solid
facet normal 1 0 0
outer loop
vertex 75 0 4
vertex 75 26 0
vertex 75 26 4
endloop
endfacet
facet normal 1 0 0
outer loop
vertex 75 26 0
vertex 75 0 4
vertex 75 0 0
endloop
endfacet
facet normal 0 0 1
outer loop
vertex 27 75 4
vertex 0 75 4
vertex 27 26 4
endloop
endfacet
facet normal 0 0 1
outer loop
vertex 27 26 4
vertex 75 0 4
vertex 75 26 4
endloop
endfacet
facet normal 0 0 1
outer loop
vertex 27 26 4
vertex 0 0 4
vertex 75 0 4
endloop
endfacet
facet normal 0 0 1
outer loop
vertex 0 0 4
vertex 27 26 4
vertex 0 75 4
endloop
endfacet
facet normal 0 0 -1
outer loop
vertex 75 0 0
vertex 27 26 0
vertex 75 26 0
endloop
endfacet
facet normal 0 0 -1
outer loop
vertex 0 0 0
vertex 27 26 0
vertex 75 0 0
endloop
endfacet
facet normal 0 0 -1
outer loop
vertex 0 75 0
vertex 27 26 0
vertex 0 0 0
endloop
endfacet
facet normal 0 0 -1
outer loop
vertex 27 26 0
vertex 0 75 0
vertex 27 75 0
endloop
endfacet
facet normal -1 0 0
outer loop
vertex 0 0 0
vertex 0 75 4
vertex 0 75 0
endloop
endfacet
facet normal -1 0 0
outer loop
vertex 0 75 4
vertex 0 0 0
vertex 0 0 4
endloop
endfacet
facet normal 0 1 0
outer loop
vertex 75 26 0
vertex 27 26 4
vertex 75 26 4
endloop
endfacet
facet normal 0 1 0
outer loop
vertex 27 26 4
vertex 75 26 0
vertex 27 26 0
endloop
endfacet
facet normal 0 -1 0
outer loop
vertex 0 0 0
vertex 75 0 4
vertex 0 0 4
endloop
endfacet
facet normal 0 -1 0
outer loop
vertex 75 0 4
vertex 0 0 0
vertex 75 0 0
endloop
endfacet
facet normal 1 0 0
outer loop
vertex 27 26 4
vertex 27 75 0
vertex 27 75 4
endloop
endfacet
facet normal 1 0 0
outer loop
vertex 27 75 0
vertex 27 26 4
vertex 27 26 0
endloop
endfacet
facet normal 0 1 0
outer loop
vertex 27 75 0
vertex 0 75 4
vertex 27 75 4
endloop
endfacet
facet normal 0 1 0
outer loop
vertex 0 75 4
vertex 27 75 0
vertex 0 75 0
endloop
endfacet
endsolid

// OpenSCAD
module corner_spacer(width, side_length_1, side_length_2, height) {
  cube([width, side_length_1, height]);
  cube([side_length_2, width, height]);
}

corner_spacer(width = 75, side_length_1 = 26, side_length_2 = 27, height = 4);
